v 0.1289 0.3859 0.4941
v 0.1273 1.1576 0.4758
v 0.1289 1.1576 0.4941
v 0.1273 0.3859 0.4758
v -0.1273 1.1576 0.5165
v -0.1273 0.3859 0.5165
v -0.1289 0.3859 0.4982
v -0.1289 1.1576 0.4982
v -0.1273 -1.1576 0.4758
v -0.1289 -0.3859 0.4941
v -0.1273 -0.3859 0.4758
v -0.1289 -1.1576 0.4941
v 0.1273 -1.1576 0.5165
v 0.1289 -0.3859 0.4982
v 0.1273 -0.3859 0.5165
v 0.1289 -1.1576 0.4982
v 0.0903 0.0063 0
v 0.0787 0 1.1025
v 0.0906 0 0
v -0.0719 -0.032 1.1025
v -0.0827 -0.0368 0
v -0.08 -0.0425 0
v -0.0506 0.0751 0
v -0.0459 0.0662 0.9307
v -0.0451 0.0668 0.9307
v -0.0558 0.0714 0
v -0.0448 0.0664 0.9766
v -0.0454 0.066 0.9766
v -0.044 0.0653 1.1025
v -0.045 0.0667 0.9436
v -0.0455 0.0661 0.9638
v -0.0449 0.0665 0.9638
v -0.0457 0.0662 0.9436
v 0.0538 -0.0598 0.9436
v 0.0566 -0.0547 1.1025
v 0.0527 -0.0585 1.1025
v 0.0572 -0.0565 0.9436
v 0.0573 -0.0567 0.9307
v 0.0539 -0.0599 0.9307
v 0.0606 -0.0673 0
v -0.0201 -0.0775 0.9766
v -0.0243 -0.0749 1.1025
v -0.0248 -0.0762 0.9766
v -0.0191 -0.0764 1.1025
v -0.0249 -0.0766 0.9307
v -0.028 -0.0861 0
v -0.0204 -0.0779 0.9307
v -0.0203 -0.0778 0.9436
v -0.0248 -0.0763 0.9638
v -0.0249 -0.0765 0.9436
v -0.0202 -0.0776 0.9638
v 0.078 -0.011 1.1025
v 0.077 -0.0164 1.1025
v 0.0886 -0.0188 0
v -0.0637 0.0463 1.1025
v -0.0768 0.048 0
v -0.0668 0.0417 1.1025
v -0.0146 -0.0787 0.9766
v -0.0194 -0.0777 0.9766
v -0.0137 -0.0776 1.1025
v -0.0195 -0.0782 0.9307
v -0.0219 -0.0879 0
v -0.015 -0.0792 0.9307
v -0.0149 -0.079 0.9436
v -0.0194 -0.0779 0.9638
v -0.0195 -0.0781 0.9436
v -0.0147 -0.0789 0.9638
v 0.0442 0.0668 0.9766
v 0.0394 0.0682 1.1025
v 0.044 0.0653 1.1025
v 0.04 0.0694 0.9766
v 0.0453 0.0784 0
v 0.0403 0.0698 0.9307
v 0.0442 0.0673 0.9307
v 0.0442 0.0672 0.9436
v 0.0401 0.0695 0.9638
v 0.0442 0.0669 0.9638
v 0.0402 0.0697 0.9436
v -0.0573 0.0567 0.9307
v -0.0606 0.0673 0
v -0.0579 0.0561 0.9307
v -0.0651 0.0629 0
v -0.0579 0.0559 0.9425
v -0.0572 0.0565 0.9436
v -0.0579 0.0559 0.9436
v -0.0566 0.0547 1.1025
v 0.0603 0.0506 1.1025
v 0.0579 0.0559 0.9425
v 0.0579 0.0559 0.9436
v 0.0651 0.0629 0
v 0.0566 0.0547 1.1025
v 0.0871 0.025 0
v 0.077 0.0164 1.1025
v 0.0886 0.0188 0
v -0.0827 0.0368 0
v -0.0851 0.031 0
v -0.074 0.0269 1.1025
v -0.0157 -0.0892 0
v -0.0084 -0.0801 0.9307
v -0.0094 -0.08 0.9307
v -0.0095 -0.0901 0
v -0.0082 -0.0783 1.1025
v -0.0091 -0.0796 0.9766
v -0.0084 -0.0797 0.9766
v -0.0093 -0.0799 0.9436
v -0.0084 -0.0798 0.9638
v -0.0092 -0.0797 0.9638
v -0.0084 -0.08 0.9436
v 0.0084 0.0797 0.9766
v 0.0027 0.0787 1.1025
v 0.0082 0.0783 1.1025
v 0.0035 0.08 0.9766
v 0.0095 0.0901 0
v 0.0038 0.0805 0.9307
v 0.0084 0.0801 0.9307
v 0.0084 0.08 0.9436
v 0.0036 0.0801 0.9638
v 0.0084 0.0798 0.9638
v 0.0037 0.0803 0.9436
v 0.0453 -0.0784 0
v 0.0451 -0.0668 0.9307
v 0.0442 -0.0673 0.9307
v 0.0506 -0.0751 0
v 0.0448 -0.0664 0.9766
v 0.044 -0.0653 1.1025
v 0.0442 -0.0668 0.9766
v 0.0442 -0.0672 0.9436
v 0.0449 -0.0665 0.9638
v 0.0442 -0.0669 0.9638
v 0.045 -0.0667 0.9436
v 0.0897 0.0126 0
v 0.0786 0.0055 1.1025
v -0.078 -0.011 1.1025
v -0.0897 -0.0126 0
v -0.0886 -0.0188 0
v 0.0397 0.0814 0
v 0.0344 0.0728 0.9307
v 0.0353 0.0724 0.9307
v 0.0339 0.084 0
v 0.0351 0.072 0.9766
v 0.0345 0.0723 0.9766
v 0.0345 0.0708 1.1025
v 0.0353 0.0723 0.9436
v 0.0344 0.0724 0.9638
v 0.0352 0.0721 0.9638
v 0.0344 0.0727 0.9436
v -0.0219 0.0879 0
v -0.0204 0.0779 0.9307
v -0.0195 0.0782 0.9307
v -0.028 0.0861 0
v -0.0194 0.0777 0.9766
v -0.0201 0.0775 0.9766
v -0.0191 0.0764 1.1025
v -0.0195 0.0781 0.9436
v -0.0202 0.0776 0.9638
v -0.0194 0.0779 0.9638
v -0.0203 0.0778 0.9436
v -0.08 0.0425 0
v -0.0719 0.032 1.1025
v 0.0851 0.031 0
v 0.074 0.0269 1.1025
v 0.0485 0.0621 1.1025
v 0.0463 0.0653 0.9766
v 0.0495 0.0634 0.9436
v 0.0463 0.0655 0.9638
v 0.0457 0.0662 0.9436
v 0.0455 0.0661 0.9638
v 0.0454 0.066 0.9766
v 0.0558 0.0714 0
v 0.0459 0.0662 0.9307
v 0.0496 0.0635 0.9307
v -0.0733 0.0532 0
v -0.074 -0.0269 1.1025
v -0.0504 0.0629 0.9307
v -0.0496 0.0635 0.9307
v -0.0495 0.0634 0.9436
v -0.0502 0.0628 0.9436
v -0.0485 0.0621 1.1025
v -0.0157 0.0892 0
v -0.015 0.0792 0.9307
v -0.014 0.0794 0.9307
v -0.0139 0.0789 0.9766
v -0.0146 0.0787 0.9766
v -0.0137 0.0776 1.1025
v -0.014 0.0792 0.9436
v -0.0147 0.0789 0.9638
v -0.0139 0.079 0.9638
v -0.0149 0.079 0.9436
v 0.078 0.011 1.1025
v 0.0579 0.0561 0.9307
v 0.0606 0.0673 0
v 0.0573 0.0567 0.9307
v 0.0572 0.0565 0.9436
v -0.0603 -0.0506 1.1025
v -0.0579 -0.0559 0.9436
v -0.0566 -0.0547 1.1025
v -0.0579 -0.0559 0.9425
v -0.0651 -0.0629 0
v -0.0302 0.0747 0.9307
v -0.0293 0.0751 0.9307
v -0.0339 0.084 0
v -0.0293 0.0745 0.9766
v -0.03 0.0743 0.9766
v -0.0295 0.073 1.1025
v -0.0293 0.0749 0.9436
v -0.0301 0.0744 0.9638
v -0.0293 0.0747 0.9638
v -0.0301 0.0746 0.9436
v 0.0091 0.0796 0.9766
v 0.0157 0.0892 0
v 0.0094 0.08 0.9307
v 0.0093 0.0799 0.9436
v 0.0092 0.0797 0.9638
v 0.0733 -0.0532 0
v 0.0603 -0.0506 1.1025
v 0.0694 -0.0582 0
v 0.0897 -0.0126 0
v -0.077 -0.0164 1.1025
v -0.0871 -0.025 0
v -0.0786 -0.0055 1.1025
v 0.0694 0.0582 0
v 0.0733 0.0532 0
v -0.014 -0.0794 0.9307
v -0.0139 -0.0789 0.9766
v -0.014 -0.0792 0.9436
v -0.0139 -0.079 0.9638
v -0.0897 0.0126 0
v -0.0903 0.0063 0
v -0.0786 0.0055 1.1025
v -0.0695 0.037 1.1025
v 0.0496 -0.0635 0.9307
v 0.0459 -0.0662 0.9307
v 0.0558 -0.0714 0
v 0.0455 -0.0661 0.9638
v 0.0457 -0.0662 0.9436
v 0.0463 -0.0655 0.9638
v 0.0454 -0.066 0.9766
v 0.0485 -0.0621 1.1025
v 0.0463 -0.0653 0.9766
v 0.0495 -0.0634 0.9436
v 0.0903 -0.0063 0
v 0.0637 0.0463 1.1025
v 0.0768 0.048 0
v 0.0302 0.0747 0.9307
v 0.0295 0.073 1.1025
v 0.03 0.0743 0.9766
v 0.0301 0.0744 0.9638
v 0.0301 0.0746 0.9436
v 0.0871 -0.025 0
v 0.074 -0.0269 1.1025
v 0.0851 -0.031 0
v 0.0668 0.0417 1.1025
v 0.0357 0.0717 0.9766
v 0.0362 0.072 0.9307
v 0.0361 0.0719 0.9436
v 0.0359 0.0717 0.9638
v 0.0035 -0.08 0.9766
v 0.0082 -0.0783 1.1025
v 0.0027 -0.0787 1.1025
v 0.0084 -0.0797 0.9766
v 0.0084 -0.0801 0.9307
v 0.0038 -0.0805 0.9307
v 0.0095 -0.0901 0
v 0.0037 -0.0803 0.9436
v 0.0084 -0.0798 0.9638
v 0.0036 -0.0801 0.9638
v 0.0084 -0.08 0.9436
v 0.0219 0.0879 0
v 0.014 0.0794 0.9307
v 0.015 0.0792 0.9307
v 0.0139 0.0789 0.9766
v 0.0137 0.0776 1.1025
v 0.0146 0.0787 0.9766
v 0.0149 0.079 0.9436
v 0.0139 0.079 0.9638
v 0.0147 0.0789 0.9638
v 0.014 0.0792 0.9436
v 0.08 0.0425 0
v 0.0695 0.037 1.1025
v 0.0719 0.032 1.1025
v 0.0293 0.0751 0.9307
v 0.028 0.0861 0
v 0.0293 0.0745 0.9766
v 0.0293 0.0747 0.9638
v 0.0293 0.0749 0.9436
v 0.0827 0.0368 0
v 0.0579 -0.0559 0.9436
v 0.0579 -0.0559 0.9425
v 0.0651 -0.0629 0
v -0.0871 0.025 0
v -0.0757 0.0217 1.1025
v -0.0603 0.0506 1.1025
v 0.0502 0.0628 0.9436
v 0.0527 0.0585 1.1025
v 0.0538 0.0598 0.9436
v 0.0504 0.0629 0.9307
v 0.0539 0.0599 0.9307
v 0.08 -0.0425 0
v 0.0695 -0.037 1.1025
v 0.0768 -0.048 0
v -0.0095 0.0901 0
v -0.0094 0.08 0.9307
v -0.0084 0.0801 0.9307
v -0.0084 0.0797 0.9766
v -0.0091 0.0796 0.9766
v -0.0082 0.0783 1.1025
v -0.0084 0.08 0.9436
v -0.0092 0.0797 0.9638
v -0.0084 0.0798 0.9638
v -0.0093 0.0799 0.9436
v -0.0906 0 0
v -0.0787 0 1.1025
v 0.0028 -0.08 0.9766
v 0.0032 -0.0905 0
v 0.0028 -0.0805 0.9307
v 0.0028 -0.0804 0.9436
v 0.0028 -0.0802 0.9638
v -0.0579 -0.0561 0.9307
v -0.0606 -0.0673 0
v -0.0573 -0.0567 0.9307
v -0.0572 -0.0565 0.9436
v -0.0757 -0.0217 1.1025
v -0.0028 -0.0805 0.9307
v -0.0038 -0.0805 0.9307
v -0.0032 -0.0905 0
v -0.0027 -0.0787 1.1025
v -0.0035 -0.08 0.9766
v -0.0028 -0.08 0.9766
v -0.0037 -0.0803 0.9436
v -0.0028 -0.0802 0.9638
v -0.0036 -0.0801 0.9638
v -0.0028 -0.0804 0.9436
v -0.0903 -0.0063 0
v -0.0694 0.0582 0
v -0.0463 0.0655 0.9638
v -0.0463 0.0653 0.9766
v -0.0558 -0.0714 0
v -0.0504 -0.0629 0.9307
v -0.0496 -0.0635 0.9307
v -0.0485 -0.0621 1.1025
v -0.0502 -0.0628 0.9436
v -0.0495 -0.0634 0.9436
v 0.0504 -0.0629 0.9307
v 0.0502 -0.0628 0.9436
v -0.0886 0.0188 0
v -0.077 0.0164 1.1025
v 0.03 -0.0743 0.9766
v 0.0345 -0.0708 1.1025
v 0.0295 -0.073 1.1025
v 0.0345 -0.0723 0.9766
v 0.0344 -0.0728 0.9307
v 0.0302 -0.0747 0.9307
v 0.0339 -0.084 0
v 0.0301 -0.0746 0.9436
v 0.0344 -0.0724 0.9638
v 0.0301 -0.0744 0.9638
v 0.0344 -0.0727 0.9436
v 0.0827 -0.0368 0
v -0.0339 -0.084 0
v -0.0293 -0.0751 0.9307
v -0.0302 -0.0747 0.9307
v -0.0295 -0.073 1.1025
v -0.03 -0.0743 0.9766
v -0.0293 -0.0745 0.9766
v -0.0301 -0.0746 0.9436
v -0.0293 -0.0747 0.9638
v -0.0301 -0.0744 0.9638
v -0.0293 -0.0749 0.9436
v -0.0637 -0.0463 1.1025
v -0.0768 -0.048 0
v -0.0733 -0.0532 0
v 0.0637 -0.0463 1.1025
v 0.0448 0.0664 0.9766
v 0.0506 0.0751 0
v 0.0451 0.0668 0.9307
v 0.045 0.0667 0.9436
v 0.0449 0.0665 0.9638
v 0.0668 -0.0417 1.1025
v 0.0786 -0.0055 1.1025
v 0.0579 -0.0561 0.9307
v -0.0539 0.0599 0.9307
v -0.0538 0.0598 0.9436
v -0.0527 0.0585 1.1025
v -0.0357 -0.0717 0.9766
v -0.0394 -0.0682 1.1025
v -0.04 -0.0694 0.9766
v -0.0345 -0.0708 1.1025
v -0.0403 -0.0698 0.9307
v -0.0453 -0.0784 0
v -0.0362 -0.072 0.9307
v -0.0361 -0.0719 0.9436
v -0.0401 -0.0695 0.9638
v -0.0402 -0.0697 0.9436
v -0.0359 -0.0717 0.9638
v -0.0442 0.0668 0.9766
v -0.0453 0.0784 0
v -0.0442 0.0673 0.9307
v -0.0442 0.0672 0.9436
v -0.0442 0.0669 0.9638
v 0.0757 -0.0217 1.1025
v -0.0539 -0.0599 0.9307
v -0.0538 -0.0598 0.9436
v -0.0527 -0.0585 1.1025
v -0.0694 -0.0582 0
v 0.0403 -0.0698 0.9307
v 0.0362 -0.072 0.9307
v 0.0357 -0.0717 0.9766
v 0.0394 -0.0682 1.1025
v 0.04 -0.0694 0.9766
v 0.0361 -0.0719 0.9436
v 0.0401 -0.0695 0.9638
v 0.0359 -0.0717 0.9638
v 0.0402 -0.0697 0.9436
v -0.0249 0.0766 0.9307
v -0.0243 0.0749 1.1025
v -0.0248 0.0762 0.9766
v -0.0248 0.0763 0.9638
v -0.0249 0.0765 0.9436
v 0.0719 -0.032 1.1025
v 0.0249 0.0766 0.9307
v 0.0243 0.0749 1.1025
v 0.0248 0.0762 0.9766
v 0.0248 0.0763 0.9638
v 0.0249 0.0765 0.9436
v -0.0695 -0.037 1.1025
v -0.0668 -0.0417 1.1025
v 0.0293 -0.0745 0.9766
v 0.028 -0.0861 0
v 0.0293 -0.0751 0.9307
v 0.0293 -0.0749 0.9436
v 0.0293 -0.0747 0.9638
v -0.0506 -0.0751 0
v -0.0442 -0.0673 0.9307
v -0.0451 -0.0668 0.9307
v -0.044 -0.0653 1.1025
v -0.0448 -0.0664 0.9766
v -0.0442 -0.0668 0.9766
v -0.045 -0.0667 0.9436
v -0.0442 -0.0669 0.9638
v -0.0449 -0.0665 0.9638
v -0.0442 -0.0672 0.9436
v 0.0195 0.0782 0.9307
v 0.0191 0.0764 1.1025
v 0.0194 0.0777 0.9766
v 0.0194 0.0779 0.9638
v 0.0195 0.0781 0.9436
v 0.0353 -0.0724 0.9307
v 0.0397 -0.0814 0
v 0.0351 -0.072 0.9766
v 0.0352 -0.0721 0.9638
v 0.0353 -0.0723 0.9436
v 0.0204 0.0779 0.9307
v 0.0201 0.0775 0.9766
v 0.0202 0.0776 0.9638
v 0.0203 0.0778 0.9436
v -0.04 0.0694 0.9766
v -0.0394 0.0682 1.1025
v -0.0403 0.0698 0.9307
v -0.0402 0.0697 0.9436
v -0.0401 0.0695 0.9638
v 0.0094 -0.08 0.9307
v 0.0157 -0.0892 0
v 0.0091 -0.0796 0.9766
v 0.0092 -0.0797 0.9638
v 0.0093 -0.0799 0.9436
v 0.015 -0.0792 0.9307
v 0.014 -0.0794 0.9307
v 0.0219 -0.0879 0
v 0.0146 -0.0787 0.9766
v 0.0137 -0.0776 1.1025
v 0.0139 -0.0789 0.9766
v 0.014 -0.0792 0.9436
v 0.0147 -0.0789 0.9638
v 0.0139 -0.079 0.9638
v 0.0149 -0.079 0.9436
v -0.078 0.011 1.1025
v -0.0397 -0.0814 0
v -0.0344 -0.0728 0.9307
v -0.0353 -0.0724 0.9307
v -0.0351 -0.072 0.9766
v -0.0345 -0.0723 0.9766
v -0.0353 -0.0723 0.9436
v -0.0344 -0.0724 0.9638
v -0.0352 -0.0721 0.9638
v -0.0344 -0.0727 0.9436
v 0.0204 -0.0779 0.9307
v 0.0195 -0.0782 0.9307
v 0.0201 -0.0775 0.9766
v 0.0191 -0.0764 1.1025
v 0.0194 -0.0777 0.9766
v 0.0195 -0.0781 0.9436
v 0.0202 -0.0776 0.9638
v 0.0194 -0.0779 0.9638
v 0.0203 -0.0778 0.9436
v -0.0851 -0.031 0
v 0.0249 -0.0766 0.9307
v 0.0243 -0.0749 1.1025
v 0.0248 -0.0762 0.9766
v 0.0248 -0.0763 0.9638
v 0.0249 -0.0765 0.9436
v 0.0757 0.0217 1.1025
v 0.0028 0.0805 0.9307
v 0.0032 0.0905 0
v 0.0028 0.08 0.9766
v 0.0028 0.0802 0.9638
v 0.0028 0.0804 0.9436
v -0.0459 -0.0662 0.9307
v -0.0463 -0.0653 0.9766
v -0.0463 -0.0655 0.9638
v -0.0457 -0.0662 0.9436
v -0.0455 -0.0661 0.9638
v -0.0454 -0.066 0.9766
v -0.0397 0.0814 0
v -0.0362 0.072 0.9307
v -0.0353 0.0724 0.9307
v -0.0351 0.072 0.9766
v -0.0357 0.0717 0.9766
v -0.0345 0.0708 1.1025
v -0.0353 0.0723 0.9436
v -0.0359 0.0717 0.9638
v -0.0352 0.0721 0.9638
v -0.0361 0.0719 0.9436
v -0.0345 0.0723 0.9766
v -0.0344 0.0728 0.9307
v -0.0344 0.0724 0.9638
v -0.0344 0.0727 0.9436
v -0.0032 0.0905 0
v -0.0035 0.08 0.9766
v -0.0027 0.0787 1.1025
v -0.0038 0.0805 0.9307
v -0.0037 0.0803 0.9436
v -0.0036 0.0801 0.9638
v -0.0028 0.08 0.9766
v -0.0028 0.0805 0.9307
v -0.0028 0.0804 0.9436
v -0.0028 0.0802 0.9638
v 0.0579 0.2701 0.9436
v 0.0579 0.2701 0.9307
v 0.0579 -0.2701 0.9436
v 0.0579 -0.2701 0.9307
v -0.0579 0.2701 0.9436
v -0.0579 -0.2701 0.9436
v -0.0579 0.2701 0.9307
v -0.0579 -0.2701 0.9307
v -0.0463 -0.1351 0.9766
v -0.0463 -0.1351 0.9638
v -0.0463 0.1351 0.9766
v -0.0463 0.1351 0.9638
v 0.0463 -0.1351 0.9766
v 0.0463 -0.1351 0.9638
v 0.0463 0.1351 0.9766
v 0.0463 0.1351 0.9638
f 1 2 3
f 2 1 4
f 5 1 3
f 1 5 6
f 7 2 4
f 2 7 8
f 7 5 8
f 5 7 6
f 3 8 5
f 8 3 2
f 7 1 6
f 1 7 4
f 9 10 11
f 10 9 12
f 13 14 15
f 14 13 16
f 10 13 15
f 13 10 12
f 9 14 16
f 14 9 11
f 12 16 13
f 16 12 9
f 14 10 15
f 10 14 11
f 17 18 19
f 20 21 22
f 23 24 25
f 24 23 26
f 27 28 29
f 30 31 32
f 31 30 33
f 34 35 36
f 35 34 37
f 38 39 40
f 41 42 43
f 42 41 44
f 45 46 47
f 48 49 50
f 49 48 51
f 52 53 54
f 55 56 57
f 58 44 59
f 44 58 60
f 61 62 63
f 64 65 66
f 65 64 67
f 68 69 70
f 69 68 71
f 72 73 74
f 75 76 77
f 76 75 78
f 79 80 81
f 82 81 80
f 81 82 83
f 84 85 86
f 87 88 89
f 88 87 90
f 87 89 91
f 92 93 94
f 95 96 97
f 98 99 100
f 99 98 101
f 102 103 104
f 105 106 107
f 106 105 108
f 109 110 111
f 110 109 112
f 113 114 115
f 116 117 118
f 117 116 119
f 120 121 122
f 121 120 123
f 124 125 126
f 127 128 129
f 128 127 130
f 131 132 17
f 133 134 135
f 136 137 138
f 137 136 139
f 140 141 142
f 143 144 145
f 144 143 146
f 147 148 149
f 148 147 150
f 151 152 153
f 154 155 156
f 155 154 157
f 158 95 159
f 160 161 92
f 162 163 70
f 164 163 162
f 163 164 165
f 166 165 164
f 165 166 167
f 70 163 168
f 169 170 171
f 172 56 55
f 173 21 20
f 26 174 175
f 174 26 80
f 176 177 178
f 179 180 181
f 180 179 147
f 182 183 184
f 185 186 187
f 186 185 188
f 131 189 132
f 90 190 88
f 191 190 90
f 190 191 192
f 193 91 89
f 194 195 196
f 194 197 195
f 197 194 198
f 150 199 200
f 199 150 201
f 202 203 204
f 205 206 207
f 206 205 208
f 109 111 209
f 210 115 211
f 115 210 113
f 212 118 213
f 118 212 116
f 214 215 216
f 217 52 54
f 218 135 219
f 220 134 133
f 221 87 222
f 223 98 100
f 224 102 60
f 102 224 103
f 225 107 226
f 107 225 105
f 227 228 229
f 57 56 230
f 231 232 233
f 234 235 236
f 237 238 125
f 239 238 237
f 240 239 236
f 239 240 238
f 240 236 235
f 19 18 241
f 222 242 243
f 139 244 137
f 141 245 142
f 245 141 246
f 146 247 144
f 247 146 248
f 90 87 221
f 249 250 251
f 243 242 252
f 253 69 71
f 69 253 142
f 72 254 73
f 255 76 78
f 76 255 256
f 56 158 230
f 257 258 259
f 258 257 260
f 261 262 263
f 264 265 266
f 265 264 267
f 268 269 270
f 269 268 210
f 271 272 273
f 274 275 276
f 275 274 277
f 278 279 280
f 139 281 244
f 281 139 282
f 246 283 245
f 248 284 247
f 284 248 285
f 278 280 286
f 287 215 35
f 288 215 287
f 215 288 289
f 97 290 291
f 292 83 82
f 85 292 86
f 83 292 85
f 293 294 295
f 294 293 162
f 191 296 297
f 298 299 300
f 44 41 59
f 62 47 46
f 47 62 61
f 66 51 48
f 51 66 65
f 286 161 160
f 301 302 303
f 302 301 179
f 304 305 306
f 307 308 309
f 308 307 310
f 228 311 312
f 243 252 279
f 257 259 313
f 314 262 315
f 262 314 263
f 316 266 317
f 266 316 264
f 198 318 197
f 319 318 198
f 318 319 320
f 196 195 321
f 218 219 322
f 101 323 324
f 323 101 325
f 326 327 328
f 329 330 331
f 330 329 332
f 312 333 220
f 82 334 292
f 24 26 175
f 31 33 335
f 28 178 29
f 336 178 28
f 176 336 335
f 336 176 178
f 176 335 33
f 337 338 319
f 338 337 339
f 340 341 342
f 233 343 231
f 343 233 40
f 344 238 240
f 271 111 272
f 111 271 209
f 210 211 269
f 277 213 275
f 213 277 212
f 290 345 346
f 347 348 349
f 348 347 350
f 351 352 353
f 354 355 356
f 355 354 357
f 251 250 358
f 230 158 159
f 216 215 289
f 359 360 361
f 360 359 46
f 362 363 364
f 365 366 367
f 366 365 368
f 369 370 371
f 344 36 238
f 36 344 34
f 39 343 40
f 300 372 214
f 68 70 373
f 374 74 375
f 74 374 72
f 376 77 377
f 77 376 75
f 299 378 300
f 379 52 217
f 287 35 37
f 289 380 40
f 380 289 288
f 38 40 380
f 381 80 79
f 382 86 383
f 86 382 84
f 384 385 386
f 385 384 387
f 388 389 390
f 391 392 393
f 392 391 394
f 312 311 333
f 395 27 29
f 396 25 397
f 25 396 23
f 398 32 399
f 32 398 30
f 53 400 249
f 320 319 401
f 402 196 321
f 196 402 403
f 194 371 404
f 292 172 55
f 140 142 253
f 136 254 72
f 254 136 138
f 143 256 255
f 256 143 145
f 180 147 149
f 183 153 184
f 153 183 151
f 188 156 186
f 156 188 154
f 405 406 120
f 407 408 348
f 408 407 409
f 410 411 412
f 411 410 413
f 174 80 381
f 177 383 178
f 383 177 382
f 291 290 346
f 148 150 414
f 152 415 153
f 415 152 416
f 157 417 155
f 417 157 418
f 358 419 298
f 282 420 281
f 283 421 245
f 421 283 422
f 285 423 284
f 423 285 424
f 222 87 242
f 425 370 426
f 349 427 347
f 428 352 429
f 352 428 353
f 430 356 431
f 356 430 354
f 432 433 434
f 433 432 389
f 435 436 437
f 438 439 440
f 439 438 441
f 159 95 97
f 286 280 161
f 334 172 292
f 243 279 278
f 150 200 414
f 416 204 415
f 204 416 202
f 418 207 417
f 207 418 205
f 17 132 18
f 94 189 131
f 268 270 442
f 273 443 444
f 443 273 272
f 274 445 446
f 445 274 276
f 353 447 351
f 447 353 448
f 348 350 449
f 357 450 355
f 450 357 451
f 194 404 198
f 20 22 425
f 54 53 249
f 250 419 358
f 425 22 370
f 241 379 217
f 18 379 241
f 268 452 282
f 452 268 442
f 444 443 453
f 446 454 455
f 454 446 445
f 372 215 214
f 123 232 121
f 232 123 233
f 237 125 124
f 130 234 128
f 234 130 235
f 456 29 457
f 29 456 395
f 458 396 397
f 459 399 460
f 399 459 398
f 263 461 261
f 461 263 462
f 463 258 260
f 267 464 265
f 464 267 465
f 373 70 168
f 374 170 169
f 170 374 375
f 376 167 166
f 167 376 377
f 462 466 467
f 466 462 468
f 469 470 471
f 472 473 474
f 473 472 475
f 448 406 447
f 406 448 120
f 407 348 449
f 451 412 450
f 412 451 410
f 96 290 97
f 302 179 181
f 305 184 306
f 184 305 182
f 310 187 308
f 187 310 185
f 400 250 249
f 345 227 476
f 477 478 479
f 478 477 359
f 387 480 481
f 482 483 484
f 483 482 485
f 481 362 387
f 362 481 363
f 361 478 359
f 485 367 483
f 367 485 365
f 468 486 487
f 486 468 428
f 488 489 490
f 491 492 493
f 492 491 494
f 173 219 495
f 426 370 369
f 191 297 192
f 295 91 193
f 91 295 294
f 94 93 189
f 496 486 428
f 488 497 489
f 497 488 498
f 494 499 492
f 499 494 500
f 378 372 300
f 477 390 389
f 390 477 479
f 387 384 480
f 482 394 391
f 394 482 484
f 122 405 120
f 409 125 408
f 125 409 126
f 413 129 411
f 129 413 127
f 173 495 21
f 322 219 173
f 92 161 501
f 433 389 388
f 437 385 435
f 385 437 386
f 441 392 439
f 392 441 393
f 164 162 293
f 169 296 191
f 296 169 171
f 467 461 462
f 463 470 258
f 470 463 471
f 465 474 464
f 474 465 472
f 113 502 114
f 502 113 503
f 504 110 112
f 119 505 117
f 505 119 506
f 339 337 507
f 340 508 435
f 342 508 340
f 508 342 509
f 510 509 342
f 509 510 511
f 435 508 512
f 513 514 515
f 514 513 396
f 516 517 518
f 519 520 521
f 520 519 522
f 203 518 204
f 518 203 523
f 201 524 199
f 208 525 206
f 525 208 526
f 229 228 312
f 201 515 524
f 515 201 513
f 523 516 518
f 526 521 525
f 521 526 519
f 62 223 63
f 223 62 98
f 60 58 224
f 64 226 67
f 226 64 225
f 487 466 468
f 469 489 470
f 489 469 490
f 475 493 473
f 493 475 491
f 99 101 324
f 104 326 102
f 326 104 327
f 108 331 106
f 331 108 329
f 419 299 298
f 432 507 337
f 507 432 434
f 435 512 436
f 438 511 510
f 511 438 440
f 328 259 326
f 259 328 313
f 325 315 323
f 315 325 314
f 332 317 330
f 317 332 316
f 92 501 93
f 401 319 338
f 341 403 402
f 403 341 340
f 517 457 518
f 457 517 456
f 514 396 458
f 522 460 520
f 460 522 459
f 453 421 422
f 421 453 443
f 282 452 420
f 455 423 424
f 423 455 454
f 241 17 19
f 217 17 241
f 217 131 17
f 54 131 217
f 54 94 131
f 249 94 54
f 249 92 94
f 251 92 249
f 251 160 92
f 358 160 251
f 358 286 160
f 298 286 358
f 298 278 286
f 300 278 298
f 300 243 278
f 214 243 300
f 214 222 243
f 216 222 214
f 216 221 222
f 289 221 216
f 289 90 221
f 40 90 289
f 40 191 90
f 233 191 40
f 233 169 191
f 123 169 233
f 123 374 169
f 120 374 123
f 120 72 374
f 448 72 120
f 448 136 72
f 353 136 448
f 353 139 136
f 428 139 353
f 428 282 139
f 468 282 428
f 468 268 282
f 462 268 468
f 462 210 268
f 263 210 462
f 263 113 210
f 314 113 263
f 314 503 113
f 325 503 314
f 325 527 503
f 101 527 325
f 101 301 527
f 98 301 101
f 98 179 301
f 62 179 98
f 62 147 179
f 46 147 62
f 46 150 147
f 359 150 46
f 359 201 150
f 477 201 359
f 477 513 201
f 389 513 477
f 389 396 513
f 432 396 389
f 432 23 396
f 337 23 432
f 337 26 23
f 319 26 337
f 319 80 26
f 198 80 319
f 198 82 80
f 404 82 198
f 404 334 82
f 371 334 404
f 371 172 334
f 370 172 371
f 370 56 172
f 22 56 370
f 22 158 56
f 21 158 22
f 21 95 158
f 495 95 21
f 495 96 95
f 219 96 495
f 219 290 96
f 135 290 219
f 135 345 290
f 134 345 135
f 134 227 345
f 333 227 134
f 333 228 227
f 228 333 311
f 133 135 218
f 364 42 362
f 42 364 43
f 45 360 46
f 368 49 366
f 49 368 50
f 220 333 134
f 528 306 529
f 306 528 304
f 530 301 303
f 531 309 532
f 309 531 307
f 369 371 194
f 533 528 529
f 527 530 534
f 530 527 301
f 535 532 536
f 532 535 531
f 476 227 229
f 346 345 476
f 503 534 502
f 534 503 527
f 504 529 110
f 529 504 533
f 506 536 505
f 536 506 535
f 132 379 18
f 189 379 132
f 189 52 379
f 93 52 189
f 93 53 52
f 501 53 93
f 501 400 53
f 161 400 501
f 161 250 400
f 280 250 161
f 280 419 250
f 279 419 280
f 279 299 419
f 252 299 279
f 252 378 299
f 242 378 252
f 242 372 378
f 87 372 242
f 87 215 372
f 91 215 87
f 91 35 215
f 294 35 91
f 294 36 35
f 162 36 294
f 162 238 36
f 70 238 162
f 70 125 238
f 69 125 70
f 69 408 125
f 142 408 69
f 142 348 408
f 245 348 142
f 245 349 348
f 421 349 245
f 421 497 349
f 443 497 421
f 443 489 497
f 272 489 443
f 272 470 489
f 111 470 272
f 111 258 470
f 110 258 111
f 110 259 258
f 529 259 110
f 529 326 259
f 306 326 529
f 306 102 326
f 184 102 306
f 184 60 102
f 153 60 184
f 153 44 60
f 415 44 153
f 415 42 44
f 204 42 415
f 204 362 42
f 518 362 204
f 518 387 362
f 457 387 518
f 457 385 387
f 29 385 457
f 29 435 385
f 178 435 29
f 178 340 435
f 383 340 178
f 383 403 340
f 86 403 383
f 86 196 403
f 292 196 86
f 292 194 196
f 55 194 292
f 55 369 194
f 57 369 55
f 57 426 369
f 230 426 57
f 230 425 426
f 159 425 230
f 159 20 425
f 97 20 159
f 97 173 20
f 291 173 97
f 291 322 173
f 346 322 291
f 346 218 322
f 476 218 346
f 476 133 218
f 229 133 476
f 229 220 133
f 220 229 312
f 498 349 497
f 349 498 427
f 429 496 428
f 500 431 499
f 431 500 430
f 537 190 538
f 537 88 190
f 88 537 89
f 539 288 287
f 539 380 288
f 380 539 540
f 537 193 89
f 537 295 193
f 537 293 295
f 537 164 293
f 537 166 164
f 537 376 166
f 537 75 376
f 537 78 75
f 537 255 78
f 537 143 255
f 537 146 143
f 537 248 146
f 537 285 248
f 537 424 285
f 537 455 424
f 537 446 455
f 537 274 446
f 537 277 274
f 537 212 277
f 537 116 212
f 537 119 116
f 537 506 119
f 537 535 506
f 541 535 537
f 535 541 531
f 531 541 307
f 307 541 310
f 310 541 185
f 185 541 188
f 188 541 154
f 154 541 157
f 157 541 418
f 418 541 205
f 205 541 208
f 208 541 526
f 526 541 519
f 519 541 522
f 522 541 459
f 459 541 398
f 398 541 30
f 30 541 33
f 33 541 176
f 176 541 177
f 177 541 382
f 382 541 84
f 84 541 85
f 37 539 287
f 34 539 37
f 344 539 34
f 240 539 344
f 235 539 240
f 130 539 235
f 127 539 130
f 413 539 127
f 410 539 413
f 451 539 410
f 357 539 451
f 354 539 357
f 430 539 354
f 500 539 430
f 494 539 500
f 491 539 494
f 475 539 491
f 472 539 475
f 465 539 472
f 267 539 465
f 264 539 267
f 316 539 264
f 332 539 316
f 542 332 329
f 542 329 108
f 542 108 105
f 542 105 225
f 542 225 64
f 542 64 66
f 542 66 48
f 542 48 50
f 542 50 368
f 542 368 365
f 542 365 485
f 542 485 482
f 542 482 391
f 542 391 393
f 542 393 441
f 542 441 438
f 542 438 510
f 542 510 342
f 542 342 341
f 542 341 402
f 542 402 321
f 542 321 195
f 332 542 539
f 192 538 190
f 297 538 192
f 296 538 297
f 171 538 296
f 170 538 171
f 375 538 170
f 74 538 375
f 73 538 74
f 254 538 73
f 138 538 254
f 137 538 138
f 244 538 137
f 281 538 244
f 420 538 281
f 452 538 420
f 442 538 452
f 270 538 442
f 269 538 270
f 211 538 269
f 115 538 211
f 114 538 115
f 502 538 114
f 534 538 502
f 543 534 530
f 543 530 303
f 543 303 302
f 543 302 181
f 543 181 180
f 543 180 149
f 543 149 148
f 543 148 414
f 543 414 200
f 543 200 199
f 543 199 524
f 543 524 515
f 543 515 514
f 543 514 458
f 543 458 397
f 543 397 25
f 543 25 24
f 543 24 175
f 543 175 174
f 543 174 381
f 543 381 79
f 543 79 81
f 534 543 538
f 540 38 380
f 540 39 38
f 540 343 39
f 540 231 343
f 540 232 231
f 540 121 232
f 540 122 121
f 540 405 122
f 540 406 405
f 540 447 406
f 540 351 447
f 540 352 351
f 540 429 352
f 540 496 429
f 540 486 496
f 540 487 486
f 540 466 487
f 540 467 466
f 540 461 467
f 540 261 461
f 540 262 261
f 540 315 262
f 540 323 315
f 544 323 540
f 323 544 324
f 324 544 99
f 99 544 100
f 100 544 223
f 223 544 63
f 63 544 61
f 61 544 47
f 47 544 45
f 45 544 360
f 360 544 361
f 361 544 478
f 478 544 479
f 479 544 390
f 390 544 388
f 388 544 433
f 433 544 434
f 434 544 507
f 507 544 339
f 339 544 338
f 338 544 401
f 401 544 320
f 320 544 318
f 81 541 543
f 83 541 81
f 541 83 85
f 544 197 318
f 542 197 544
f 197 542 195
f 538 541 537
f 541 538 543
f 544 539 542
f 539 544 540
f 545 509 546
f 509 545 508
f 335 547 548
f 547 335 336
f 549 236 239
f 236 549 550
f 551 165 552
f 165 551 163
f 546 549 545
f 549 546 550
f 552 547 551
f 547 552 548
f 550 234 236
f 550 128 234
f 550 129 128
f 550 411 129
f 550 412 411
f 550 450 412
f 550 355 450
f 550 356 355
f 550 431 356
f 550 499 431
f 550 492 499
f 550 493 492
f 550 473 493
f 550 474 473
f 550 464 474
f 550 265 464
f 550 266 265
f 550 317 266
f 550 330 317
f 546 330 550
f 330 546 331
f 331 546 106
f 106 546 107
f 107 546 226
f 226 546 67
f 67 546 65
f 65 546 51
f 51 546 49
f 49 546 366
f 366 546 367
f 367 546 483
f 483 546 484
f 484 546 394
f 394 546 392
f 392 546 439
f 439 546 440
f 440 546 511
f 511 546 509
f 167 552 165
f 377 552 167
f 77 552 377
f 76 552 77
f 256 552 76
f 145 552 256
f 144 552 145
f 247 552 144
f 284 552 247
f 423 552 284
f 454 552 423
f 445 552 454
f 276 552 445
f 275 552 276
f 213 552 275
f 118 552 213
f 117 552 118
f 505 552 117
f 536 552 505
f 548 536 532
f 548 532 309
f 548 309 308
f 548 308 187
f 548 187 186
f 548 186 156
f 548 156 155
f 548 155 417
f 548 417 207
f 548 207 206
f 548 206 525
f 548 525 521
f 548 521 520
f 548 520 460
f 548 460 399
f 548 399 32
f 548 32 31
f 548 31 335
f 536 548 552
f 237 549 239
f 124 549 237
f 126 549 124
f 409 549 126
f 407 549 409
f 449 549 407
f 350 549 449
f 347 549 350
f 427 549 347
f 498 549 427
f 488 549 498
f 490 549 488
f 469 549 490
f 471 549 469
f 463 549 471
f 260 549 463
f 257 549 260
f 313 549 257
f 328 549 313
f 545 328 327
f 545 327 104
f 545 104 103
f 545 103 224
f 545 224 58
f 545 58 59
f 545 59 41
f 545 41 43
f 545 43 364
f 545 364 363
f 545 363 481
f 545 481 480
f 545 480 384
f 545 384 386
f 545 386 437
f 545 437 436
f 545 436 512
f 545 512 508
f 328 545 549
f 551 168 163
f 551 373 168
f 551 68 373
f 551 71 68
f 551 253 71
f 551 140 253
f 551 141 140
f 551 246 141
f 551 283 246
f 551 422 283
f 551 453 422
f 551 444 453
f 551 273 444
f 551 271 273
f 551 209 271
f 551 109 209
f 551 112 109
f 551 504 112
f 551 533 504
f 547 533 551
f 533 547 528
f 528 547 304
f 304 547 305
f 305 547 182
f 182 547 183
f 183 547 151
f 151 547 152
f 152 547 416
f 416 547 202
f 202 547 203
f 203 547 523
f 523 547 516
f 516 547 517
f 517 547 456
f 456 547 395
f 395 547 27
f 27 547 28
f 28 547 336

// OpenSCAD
// ==========================================
// GENERATED AIRCRAFT VARIANT 1
// ==========================================

$fn = 90;

// --------- FUSELAGE ----------
module fuselage() {
    cylinder(h=1.1025,
             r1=0.09056249999999999,
             r2=0.07875,
             center=false);
}

// --------- WING ----------
module wing_half(sign=1) {
    rotate([0, 5*sign, 0])
    translate([0, sign*0.77175, 0])
    cube([0.25725000000000003,
          0.77175,
          0.018375000000000002],
          center=true);
}

module wing() {
    wing_half(1);
    wing_half(-1);
}

// --------- TAIL ----------
module tail() {
    translate([0, 0, 0.937125])
    cube([0.11576250000000002,
          0.540225,
          0.0128625],
          center=true);
}

module vertical_tail() {
    translate([0, 0, 0.9702000000000001])
    rotate([90,0,0])
    cube([0.09261000000000003,
          0.0128625,
          0.2701125],
          center=true);
}

union() {
    fuselage();
    translate([0,0,0.49612500000000004]) wing();
    tail();
    vertical_tail();
}
